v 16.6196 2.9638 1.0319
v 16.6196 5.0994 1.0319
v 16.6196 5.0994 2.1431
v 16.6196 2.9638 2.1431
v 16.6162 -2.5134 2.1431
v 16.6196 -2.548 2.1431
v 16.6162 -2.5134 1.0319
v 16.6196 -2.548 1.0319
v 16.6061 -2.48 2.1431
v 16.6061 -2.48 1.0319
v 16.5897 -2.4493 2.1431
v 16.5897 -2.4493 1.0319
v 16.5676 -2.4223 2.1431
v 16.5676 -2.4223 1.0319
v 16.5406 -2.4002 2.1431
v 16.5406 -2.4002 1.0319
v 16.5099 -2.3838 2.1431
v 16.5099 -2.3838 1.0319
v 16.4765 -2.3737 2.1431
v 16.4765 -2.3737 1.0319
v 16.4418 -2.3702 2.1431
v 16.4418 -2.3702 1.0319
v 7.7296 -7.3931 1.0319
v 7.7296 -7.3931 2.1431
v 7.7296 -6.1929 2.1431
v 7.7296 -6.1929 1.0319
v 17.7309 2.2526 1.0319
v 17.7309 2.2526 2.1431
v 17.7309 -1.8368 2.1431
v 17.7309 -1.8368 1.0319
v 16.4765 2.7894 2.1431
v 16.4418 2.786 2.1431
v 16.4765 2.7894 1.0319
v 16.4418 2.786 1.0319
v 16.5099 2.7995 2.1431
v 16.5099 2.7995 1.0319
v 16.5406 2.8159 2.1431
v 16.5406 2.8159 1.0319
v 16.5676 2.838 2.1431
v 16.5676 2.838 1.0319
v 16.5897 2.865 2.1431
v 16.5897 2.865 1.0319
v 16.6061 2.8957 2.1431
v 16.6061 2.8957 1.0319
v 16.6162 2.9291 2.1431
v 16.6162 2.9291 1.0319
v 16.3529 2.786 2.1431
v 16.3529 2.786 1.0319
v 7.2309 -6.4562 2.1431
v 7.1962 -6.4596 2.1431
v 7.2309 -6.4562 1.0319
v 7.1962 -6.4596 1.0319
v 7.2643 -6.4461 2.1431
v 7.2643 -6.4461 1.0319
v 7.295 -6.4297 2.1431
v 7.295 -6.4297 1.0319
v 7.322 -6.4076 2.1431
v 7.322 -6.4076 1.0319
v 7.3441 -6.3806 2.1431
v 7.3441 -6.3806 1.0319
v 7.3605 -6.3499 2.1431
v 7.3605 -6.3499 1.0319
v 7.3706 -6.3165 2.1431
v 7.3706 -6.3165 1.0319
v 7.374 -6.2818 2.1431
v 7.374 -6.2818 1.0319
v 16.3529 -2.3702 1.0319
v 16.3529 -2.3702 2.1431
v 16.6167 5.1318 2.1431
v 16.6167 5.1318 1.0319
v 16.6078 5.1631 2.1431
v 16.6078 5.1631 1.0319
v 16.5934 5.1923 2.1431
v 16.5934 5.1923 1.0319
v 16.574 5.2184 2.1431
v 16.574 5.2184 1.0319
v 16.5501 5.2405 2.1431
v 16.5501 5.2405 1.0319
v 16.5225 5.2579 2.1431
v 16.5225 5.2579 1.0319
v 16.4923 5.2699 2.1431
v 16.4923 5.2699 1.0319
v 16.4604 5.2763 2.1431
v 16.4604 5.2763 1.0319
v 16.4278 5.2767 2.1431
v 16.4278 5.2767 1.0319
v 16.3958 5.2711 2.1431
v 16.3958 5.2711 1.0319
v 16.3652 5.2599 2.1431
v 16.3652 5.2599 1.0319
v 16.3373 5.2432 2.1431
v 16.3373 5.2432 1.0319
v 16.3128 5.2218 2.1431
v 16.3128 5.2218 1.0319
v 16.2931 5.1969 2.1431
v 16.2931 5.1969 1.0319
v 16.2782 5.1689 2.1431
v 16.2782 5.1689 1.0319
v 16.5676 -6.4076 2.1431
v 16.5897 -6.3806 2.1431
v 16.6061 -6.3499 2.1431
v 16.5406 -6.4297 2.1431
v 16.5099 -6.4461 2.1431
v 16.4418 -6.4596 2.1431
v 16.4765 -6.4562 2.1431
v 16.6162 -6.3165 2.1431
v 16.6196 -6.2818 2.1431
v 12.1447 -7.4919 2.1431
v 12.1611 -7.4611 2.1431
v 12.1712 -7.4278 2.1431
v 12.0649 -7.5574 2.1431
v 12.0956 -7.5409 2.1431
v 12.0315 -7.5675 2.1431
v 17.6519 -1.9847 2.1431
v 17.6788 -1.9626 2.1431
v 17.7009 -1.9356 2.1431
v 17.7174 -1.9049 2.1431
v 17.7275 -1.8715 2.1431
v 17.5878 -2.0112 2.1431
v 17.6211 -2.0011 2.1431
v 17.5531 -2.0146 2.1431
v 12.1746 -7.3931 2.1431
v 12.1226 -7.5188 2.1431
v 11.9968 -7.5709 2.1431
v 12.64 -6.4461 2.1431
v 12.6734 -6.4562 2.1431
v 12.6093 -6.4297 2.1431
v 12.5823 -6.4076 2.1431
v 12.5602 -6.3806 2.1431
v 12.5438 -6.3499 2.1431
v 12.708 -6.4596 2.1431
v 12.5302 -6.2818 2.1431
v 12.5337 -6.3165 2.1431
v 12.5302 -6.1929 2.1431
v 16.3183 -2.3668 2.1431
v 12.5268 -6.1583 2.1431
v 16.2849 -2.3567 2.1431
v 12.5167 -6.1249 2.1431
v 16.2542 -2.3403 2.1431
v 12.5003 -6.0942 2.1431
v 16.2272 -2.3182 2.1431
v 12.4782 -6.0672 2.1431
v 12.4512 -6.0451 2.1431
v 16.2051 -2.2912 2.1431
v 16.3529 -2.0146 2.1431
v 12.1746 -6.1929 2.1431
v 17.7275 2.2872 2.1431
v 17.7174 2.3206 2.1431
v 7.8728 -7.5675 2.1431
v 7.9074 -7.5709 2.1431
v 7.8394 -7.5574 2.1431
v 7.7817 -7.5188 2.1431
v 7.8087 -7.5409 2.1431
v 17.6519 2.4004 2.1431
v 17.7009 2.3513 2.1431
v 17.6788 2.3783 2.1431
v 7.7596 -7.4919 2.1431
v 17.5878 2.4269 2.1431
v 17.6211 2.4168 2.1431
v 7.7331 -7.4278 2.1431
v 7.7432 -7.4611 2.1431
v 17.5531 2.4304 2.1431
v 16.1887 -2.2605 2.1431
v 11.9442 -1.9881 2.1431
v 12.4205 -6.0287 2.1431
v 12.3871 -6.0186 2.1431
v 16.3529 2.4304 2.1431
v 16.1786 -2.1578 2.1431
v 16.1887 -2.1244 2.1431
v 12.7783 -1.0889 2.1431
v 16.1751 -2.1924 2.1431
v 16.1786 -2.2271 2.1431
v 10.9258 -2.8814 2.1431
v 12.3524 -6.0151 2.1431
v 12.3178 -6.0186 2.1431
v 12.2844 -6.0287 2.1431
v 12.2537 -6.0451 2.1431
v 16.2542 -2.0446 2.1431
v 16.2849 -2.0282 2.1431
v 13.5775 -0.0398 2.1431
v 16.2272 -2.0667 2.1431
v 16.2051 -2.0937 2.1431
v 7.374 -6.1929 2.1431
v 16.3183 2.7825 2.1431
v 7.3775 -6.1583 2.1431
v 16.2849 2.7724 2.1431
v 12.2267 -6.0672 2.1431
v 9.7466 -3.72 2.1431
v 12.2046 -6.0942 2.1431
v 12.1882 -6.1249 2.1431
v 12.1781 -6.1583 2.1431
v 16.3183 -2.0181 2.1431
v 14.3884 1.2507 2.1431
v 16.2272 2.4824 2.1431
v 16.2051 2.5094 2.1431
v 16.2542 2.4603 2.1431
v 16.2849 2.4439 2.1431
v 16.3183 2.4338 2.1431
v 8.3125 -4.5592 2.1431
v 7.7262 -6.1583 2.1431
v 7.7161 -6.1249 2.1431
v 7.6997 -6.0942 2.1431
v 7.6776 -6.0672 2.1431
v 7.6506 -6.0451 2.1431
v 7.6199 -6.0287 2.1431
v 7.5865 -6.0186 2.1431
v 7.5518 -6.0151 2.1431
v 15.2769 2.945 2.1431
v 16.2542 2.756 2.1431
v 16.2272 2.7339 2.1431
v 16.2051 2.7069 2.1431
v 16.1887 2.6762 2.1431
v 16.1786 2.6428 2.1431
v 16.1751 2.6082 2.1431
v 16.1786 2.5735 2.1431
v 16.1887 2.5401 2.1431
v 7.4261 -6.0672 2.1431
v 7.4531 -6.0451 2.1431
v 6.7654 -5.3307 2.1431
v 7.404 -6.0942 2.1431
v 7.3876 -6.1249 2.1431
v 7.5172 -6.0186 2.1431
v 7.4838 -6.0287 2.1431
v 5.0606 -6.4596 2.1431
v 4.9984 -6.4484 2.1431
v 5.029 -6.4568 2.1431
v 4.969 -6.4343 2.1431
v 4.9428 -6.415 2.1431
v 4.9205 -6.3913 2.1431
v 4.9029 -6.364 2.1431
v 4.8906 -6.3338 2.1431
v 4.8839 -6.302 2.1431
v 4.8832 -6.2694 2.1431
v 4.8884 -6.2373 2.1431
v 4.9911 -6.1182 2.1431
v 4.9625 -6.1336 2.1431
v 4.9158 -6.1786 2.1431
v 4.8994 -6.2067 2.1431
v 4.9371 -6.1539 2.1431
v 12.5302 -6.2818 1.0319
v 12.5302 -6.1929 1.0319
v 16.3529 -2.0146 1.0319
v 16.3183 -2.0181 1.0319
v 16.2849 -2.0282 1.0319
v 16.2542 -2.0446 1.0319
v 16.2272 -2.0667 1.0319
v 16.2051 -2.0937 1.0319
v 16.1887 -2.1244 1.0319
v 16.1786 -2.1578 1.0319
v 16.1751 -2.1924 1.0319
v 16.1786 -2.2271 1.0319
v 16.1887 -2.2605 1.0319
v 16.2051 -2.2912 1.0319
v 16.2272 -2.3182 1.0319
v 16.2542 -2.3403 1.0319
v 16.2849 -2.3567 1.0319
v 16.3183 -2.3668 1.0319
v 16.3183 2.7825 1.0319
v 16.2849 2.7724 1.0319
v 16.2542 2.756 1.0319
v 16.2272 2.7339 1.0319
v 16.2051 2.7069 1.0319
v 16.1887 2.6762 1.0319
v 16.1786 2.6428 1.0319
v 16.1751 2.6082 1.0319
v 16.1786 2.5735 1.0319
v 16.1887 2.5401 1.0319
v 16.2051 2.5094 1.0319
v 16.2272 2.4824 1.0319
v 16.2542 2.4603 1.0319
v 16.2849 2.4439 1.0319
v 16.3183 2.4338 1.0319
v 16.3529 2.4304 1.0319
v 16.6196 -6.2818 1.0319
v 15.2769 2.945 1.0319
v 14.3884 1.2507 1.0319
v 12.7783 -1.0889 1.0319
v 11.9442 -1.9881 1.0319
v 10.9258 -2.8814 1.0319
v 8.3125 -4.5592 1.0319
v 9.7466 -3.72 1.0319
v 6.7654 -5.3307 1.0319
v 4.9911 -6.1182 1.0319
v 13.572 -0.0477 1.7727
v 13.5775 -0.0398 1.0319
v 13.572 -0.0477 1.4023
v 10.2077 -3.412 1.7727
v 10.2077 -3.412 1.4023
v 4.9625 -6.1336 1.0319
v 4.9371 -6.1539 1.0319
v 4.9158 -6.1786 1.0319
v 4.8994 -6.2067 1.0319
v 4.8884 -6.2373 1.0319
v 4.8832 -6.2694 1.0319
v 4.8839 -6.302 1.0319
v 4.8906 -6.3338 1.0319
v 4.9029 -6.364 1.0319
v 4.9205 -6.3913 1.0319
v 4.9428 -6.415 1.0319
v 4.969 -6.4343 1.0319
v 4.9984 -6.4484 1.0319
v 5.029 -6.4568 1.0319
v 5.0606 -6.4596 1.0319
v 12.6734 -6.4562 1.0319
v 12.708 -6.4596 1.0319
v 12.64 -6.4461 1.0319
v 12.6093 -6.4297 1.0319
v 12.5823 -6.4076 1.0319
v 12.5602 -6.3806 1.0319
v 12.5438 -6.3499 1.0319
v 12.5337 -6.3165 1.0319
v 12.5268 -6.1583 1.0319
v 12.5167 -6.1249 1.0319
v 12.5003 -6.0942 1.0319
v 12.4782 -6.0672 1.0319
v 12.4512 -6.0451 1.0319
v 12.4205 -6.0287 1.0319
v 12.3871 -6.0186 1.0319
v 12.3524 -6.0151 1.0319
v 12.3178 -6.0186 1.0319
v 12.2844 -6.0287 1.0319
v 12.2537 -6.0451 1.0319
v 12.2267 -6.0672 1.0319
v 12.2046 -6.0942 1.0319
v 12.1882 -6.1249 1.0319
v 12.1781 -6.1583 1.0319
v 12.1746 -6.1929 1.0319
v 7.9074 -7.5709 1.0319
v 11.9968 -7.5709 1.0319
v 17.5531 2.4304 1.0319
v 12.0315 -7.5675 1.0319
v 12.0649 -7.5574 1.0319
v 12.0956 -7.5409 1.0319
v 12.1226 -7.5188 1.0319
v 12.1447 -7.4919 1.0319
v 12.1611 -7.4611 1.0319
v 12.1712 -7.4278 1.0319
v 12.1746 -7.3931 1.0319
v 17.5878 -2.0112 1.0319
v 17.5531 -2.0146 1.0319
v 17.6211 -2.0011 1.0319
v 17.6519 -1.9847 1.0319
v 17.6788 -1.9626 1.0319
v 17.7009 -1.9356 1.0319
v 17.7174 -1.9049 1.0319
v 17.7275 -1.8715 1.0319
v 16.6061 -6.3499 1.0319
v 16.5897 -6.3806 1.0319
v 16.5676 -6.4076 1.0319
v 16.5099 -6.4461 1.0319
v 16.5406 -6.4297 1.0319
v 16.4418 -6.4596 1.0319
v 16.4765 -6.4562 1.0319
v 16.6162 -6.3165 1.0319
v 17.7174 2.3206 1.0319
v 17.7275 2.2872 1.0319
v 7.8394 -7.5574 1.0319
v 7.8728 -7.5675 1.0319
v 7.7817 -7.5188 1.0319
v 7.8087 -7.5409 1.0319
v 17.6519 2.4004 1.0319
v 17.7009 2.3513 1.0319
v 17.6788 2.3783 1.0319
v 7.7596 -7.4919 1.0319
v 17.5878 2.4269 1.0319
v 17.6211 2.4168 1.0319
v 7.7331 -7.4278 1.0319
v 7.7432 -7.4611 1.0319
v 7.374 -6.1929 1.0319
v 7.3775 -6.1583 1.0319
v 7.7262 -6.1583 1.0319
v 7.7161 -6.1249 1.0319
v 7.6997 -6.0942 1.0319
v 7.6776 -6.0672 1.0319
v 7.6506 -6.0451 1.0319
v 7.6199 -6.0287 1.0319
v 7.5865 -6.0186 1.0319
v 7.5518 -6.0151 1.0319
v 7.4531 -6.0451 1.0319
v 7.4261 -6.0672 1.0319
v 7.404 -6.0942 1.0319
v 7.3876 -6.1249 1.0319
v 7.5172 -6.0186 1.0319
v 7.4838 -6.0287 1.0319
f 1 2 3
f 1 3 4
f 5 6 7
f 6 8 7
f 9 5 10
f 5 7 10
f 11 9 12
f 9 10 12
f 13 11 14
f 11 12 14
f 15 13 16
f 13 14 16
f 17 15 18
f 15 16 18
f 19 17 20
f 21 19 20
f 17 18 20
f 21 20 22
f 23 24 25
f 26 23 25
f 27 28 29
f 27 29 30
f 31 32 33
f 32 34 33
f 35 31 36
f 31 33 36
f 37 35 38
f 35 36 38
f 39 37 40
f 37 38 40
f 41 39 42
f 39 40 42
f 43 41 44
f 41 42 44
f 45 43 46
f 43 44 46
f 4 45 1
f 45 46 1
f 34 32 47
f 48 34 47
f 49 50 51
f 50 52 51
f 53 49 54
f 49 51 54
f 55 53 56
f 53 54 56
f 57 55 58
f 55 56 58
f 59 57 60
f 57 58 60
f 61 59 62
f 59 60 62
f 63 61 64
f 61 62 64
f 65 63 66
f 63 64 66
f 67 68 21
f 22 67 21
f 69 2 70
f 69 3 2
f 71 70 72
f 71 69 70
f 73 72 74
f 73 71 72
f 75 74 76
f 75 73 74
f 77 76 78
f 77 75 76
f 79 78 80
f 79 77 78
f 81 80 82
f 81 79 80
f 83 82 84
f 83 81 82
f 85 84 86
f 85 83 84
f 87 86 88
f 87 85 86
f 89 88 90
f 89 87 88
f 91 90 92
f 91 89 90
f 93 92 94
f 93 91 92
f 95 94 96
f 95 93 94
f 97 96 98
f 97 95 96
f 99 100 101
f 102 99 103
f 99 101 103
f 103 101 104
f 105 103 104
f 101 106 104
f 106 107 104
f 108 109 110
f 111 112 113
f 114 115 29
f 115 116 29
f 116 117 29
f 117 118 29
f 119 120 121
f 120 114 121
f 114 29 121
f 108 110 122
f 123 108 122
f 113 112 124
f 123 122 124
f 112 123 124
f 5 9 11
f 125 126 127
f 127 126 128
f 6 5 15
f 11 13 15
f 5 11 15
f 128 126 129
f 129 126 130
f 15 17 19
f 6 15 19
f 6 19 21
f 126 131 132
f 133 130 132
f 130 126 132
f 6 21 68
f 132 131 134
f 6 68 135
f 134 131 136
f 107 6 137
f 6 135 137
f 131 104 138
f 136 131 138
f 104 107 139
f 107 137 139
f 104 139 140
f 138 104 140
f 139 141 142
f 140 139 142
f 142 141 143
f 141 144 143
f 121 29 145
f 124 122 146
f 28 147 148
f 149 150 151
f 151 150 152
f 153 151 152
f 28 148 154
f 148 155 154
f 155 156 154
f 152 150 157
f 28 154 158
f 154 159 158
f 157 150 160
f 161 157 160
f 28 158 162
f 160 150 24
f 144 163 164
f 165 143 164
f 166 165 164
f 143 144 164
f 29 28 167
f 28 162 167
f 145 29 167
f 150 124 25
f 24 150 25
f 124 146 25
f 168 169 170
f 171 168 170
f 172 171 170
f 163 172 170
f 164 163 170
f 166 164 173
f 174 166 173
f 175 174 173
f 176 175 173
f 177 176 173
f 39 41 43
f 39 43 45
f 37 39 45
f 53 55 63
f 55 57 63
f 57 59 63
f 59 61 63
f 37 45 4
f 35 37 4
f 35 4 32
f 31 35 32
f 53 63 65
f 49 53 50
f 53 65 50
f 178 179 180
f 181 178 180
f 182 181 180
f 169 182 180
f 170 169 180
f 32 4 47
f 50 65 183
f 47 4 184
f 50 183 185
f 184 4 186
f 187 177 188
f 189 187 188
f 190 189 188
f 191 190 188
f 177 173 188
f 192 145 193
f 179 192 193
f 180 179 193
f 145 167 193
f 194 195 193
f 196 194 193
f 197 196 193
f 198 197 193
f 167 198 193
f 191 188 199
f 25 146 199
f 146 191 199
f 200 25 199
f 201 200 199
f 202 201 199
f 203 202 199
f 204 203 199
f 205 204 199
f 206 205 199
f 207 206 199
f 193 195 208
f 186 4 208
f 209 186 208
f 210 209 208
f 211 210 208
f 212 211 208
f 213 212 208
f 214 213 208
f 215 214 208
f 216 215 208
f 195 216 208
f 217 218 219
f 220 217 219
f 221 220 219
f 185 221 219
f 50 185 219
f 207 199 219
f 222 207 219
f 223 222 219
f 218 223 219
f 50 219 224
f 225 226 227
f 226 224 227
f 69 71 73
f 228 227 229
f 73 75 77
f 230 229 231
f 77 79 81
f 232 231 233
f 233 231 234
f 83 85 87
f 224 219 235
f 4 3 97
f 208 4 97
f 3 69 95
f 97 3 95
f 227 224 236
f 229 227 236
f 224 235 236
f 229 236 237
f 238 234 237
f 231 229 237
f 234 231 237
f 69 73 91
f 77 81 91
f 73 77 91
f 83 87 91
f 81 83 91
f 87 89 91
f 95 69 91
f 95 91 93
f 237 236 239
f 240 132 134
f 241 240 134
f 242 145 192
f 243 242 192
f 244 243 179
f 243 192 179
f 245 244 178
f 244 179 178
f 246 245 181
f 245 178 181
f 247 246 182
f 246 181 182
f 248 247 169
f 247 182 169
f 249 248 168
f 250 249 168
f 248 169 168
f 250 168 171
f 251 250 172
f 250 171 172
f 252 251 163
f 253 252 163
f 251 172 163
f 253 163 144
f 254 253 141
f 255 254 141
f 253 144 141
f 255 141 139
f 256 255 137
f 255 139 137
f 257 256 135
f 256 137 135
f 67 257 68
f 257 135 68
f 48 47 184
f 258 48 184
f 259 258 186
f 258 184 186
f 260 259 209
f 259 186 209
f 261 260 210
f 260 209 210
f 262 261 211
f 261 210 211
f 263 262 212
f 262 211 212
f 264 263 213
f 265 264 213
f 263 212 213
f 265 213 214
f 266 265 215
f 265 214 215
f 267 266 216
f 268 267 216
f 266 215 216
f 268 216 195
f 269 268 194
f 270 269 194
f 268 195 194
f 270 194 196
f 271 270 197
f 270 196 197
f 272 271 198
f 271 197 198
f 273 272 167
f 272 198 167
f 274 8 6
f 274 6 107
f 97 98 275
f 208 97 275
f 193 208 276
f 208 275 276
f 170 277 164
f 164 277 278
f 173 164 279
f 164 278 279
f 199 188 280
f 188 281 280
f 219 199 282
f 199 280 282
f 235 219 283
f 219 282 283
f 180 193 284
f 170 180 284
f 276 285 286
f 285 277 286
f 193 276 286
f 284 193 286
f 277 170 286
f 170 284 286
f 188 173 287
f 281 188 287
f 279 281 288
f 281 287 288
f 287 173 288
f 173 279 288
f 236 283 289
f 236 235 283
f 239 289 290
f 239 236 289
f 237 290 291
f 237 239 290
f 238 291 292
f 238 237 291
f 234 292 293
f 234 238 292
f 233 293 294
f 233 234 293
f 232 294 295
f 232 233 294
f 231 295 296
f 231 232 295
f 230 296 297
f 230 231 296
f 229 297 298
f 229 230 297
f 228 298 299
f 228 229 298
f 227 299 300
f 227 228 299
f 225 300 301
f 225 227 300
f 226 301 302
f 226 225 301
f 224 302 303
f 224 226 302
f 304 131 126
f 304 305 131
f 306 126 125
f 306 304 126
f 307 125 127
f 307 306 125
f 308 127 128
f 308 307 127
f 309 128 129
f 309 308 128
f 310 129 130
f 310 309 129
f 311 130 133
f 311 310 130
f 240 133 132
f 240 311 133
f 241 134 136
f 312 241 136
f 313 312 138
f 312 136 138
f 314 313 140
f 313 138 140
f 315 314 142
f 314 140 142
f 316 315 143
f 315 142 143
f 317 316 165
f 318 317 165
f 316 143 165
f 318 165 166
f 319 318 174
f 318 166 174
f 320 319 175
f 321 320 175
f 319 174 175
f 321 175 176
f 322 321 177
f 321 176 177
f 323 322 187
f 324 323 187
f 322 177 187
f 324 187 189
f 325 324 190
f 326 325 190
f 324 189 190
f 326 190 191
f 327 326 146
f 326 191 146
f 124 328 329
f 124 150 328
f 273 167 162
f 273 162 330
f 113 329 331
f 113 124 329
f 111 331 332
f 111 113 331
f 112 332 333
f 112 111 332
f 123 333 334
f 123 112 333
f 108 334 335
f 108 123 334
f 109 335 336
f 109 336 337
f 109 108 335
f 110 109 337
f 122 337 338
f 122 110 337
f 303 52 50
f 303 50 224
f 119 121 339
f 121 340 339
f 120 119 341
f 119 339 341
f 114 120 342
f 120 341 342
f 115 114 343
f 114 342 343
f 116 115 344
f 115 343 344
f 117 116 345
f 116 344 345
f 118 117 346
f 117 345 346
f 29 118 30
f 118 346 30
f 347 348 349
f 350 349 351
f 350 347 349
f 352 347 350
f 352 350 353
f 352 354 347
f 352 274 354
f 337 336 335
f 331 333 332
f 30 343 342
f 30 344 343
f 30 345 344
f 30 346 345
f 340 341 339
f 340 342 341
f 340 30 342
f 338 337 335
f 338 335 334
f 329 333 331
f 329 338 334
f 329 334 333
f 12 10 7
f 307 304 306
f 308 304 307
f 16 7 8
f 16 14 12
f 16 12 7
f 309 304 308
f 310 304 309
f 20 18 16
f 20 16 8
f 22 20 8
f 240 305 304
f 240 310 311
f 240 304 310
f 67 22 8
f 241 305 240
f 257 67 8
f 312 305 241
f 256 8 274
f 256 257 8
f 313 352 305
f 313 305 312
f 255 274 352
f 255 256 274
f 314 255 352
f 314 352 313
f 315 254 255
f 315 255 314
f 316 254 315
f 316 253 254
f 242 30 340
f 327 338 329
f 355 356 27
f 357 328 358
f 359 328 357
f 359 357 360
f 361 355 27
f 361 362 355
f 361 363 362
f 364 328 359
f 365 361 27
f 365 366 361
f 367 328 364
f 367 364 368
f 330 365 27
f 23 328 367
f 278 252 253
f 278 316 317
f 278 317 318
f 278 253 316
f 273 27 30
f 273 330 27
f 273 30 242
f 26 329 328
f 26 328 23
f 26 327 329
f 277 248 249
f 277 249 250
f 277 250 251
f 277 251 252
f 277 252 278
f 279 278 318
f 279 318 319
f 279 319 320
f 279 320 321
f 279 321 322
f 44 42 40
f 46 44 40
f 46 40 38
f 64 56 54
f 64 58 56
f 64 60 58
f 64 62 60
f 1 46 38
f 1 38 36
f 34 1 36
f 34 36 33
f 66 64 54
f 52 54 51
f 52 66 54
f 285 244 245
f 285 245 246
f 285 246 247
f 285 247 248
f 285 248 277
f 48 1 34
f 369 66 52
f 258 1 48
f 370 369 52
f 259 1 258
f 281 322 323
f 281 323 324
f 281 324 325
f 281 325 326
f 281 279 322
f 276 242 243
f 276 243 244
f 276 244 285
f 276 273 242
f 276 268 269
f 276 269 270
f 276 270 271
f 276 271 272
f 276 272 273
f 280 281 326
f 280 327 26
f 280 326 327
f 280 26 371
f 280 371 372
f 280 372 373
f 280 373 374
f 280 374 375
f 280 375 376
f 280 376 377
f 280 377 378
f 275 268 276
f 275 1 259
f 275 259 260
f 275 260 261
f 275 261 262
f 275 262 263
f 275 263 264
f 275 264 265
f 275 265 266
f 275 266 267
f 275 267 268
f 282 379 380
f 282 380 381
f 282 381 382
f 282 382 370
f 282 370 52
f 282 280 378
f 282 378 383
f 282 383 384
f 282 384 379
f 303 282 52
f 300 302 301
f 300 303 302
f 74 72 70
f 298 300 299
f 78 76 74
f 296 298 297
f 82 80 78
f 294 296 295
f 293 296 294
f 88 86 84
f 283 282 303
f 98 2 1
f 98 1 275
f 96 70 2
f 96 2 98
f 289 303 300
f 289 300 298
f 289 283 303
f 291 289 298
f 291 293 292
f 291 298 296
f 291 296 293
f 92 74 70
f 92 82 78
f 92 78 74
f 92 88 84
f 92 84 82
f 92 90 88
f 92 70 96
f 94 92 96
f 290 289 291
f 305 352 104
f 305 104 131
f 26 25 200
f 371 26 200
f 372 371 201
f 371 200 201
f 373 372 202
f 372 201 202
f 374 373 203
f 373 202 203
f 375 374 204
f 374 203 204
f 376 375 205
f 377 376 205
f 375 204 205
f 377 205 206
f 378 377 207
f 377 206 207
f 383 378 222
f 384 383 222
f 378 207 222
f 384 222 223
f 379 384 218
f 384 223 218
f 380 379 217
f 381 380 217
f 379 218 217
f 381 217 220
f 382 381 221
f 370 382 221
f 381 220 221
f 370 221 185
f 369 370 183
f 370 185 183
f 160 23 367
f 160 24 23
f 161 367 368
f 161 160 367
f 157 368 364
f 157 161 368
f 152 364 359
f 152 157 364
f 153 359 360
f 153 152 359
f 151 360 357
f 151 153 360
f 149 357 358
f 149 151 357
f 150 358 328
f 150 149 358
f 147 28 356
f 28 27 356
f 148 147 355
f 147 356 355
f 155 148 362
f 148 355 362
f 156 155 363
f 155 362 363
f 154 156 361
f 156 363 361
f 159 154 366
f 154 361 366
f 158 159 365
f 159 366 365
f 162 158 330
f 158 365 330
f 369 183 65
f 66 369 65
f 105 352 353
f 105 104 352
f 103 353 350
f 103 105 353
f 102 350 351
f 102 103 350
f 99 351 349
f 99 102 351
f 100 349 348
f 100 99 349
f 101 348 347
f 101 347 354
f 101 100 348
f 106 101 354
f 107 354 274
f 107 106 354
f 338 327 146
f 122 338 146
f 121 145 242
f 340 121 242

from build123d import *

# Parameters (mm, degrees)
BOSS_EXTRUDE1_DEPTH = 3.175
SKETCH2_W           = 12.7
SKETCH2_H           = 3.175
BOSS_EXTRUDE2_DEPTH = 3.175
SKETCH3_W           = 3.175
SKETCH3_H           = 12.7
BOSS_EXTRUDE3_DEPTH = 3.175
CUT_EXTRUDE1_REACH  = 5.175
FILLET1_R           = 0.508
SCALE1_SCALE        = 0.35


with BuildPart() as part:
    # Sketch1 → Boss-Extrude1 (new body)
    with BuildSketch(Plane.XY):
        with BuildLine():
            Line((22.86, -12.7), (-12.7, -12.7))
            add(Edge.make_bspline(
                [(22.86, 22.86), (14.060256121, 1.487897552), (8.672102448, -3.900256121), (-12.7, -12.7)],
                knots=[0, 0, 0, 0, 1, 1, 1, 1], degree=3))
            Line((22.86, 22.86), (22.86, -12.7))
        make_face()
    extrude(amount=BOSS_EXTRUDE1_DEPTH)

    # Sketch2 → Boss-Extrude2 (add)
    with BuildSketch(Plane.XZ.offset(12.7)):
        with Locations((3.81, 1.5875)):
            Rectangle(SKETCH2_W, SKETCH2_H)
    extrude(amount=BOSS_EXTRUDE2_DEPTH)

    # Sketch3 → Boss-Extrude3 (add)
    with BuildSketch(Plane(origin=(22.86, 0, 0), x_dir=(0, 0, -1), z_dir=(1, 0, 0))):
        with Locations((-1.5875, 6.35)):
            Rectangle(SKETCH3_W, SKETCH3_H)
    extrude(amount=BOSS_EXTRUDE3_DEPTH)

    # Sketch4 → Cut-Extrude1 (cut, up to next)
    with BuildSketch(Plane.XY.offset(3.175), mode=Mode.PRIVATE) as cut_extrude1_sk1:
        with BuildLine():
            Line((-3.556, -11.938), (-3.556, -12.7))
            Line((-3.556, -12.7), (-2.54, -12.7))
            Line((-2.54, -12.7), (-2.54, -11.938))
            ThreePointArc((-2.54, -11.938), (-3.048, -11.43), (-3.556, -11.938))
        make_face()
    cut_extrude1_tool1 = extrude(cut_extrude1_sk1.sketch, amount=-CUT_EXTRUDE1_REACH, mode=Mode.PRIVATE) & part.part
    add(cut_extrude1_tool1.solids().sort_by_distance((-3.048, -12.113972, 3.175))[0], mode=Mode.SUBTRACT)
    # Sketch4 → Cut-Extrude1 (cut, up to next)
    with BuildSketch(Plane.XY.offset(3.175), mode=Mode.PRIVATE) as cut_extrude1_sk2:
        with BuildLine():
            Line((10.16, -11.938), (10.16, -12.7))
            Line((10.16, -12.7), (11.176, -12.7))
            Line((11.176, -12.7), (11.176, -11.938))
            ThreePointArc((11.176, -11.938), (10.668, -11.43), (10.16, -11.938))
        make_face()
    cut_extrude1_tool2 = extrude(cut_extrude1_sk2.sketch, amount=-CUT_EXTRUDE1_REACH, mode=Mode.PRIVATE) & part.part
    add(cut_extrude1_tool2.solids().sort_by_distance((10.668, -12.113972, 3.175))[0], mode=Mode.SUBTRACT)
    # Sketch4 → Cut-Extrude1 (cut, up to next)
    with BuildSketch(Plane.XY.offset(3.175), mode=Mode.PRIVATE) as cut_extrude1_sk3:
        with BuildLine():
            Line((22.098, -1.016), (22.86, -1.016))
            Line((22.86, -1.016), (22.86, 0))
            Line((22.86, 0), (22.098, 0))
            ThreePointArc((22.098, 0), (21.59, -0.508), (22.098, -1.016))
        make_face()
    cut_extrude1_tool3 = extrude(cut_extrude1_sk3.sketch, amount=-CUT_EXTRUDE1_REACH, mode=Mode.PRIVATE) & part.part
    add(cut_extrude1_tool3.solids().sort_by_distance((22.273972, -0.508, 3.175))[0], mode=Mode.SUBTRACT)
    # Sketch4 → Cut-Extrude1 (cut, up to next)
    with BuildSketch(Plane.XY.offset(3.175), mode=Mode.PRIVATE) as cut_extrude1_sk4:
        with BuildLine():
            Line((22.098, 12.7), (22.86, 12.7))
            Line((22.86, 12.7), (22.86, 13.716))
            Line((22.86, 13.716), (22.098, 13.716))
            ThreePointArc((22.098, 13.716), (21.59, 13.208), (22.098, 12.7))
        make_face()
    cut_extrude1_tool4 = extrude(cut_extrude1_sk4.sketch, amount=-CUT_EXTRUDE1_REACH, mode=Mode.PRIVATE) & part.part
    add(cut_extrude1_tool4.solids().sort_by_distance((22.273972, 13.208, 3.175))[0], mode=Mode.SUBTRACT)

    # Fillet1
    fillet1_edges = [part.edges().sort_by_distance(p)[0] for p in [
        (22.86, 13.716, 1.5875),
        (26.035, 12.7, 1.5875),
        (26.035, 0, 1.5875),
        (22.86, -1.016, 1.5875),
        (22.86, -12.7, 1.5875),
        (11.176, -12.7, 1.5875),
        (10.16, -15.875, 1.5875),
        (-2.54, -15.875, 1.5875),
        (-3.556, -12.7, 1.5875),
        (-12.7, -12.7, 1.5875),
        (22.86, 22.86, 1.5875),
    ]]
    fillet(fillet1_edges, radius=FILLET1_R)


with BuildPart() as part_1:
    # Scale1: scaled about (13.259441719, -3.099441698, 1.5875)
    add(part.part.scale(SCALE1_SCALE).moved(Location((8.618637117, -2.014637104, 1.031875))))


solid = part_1.part
